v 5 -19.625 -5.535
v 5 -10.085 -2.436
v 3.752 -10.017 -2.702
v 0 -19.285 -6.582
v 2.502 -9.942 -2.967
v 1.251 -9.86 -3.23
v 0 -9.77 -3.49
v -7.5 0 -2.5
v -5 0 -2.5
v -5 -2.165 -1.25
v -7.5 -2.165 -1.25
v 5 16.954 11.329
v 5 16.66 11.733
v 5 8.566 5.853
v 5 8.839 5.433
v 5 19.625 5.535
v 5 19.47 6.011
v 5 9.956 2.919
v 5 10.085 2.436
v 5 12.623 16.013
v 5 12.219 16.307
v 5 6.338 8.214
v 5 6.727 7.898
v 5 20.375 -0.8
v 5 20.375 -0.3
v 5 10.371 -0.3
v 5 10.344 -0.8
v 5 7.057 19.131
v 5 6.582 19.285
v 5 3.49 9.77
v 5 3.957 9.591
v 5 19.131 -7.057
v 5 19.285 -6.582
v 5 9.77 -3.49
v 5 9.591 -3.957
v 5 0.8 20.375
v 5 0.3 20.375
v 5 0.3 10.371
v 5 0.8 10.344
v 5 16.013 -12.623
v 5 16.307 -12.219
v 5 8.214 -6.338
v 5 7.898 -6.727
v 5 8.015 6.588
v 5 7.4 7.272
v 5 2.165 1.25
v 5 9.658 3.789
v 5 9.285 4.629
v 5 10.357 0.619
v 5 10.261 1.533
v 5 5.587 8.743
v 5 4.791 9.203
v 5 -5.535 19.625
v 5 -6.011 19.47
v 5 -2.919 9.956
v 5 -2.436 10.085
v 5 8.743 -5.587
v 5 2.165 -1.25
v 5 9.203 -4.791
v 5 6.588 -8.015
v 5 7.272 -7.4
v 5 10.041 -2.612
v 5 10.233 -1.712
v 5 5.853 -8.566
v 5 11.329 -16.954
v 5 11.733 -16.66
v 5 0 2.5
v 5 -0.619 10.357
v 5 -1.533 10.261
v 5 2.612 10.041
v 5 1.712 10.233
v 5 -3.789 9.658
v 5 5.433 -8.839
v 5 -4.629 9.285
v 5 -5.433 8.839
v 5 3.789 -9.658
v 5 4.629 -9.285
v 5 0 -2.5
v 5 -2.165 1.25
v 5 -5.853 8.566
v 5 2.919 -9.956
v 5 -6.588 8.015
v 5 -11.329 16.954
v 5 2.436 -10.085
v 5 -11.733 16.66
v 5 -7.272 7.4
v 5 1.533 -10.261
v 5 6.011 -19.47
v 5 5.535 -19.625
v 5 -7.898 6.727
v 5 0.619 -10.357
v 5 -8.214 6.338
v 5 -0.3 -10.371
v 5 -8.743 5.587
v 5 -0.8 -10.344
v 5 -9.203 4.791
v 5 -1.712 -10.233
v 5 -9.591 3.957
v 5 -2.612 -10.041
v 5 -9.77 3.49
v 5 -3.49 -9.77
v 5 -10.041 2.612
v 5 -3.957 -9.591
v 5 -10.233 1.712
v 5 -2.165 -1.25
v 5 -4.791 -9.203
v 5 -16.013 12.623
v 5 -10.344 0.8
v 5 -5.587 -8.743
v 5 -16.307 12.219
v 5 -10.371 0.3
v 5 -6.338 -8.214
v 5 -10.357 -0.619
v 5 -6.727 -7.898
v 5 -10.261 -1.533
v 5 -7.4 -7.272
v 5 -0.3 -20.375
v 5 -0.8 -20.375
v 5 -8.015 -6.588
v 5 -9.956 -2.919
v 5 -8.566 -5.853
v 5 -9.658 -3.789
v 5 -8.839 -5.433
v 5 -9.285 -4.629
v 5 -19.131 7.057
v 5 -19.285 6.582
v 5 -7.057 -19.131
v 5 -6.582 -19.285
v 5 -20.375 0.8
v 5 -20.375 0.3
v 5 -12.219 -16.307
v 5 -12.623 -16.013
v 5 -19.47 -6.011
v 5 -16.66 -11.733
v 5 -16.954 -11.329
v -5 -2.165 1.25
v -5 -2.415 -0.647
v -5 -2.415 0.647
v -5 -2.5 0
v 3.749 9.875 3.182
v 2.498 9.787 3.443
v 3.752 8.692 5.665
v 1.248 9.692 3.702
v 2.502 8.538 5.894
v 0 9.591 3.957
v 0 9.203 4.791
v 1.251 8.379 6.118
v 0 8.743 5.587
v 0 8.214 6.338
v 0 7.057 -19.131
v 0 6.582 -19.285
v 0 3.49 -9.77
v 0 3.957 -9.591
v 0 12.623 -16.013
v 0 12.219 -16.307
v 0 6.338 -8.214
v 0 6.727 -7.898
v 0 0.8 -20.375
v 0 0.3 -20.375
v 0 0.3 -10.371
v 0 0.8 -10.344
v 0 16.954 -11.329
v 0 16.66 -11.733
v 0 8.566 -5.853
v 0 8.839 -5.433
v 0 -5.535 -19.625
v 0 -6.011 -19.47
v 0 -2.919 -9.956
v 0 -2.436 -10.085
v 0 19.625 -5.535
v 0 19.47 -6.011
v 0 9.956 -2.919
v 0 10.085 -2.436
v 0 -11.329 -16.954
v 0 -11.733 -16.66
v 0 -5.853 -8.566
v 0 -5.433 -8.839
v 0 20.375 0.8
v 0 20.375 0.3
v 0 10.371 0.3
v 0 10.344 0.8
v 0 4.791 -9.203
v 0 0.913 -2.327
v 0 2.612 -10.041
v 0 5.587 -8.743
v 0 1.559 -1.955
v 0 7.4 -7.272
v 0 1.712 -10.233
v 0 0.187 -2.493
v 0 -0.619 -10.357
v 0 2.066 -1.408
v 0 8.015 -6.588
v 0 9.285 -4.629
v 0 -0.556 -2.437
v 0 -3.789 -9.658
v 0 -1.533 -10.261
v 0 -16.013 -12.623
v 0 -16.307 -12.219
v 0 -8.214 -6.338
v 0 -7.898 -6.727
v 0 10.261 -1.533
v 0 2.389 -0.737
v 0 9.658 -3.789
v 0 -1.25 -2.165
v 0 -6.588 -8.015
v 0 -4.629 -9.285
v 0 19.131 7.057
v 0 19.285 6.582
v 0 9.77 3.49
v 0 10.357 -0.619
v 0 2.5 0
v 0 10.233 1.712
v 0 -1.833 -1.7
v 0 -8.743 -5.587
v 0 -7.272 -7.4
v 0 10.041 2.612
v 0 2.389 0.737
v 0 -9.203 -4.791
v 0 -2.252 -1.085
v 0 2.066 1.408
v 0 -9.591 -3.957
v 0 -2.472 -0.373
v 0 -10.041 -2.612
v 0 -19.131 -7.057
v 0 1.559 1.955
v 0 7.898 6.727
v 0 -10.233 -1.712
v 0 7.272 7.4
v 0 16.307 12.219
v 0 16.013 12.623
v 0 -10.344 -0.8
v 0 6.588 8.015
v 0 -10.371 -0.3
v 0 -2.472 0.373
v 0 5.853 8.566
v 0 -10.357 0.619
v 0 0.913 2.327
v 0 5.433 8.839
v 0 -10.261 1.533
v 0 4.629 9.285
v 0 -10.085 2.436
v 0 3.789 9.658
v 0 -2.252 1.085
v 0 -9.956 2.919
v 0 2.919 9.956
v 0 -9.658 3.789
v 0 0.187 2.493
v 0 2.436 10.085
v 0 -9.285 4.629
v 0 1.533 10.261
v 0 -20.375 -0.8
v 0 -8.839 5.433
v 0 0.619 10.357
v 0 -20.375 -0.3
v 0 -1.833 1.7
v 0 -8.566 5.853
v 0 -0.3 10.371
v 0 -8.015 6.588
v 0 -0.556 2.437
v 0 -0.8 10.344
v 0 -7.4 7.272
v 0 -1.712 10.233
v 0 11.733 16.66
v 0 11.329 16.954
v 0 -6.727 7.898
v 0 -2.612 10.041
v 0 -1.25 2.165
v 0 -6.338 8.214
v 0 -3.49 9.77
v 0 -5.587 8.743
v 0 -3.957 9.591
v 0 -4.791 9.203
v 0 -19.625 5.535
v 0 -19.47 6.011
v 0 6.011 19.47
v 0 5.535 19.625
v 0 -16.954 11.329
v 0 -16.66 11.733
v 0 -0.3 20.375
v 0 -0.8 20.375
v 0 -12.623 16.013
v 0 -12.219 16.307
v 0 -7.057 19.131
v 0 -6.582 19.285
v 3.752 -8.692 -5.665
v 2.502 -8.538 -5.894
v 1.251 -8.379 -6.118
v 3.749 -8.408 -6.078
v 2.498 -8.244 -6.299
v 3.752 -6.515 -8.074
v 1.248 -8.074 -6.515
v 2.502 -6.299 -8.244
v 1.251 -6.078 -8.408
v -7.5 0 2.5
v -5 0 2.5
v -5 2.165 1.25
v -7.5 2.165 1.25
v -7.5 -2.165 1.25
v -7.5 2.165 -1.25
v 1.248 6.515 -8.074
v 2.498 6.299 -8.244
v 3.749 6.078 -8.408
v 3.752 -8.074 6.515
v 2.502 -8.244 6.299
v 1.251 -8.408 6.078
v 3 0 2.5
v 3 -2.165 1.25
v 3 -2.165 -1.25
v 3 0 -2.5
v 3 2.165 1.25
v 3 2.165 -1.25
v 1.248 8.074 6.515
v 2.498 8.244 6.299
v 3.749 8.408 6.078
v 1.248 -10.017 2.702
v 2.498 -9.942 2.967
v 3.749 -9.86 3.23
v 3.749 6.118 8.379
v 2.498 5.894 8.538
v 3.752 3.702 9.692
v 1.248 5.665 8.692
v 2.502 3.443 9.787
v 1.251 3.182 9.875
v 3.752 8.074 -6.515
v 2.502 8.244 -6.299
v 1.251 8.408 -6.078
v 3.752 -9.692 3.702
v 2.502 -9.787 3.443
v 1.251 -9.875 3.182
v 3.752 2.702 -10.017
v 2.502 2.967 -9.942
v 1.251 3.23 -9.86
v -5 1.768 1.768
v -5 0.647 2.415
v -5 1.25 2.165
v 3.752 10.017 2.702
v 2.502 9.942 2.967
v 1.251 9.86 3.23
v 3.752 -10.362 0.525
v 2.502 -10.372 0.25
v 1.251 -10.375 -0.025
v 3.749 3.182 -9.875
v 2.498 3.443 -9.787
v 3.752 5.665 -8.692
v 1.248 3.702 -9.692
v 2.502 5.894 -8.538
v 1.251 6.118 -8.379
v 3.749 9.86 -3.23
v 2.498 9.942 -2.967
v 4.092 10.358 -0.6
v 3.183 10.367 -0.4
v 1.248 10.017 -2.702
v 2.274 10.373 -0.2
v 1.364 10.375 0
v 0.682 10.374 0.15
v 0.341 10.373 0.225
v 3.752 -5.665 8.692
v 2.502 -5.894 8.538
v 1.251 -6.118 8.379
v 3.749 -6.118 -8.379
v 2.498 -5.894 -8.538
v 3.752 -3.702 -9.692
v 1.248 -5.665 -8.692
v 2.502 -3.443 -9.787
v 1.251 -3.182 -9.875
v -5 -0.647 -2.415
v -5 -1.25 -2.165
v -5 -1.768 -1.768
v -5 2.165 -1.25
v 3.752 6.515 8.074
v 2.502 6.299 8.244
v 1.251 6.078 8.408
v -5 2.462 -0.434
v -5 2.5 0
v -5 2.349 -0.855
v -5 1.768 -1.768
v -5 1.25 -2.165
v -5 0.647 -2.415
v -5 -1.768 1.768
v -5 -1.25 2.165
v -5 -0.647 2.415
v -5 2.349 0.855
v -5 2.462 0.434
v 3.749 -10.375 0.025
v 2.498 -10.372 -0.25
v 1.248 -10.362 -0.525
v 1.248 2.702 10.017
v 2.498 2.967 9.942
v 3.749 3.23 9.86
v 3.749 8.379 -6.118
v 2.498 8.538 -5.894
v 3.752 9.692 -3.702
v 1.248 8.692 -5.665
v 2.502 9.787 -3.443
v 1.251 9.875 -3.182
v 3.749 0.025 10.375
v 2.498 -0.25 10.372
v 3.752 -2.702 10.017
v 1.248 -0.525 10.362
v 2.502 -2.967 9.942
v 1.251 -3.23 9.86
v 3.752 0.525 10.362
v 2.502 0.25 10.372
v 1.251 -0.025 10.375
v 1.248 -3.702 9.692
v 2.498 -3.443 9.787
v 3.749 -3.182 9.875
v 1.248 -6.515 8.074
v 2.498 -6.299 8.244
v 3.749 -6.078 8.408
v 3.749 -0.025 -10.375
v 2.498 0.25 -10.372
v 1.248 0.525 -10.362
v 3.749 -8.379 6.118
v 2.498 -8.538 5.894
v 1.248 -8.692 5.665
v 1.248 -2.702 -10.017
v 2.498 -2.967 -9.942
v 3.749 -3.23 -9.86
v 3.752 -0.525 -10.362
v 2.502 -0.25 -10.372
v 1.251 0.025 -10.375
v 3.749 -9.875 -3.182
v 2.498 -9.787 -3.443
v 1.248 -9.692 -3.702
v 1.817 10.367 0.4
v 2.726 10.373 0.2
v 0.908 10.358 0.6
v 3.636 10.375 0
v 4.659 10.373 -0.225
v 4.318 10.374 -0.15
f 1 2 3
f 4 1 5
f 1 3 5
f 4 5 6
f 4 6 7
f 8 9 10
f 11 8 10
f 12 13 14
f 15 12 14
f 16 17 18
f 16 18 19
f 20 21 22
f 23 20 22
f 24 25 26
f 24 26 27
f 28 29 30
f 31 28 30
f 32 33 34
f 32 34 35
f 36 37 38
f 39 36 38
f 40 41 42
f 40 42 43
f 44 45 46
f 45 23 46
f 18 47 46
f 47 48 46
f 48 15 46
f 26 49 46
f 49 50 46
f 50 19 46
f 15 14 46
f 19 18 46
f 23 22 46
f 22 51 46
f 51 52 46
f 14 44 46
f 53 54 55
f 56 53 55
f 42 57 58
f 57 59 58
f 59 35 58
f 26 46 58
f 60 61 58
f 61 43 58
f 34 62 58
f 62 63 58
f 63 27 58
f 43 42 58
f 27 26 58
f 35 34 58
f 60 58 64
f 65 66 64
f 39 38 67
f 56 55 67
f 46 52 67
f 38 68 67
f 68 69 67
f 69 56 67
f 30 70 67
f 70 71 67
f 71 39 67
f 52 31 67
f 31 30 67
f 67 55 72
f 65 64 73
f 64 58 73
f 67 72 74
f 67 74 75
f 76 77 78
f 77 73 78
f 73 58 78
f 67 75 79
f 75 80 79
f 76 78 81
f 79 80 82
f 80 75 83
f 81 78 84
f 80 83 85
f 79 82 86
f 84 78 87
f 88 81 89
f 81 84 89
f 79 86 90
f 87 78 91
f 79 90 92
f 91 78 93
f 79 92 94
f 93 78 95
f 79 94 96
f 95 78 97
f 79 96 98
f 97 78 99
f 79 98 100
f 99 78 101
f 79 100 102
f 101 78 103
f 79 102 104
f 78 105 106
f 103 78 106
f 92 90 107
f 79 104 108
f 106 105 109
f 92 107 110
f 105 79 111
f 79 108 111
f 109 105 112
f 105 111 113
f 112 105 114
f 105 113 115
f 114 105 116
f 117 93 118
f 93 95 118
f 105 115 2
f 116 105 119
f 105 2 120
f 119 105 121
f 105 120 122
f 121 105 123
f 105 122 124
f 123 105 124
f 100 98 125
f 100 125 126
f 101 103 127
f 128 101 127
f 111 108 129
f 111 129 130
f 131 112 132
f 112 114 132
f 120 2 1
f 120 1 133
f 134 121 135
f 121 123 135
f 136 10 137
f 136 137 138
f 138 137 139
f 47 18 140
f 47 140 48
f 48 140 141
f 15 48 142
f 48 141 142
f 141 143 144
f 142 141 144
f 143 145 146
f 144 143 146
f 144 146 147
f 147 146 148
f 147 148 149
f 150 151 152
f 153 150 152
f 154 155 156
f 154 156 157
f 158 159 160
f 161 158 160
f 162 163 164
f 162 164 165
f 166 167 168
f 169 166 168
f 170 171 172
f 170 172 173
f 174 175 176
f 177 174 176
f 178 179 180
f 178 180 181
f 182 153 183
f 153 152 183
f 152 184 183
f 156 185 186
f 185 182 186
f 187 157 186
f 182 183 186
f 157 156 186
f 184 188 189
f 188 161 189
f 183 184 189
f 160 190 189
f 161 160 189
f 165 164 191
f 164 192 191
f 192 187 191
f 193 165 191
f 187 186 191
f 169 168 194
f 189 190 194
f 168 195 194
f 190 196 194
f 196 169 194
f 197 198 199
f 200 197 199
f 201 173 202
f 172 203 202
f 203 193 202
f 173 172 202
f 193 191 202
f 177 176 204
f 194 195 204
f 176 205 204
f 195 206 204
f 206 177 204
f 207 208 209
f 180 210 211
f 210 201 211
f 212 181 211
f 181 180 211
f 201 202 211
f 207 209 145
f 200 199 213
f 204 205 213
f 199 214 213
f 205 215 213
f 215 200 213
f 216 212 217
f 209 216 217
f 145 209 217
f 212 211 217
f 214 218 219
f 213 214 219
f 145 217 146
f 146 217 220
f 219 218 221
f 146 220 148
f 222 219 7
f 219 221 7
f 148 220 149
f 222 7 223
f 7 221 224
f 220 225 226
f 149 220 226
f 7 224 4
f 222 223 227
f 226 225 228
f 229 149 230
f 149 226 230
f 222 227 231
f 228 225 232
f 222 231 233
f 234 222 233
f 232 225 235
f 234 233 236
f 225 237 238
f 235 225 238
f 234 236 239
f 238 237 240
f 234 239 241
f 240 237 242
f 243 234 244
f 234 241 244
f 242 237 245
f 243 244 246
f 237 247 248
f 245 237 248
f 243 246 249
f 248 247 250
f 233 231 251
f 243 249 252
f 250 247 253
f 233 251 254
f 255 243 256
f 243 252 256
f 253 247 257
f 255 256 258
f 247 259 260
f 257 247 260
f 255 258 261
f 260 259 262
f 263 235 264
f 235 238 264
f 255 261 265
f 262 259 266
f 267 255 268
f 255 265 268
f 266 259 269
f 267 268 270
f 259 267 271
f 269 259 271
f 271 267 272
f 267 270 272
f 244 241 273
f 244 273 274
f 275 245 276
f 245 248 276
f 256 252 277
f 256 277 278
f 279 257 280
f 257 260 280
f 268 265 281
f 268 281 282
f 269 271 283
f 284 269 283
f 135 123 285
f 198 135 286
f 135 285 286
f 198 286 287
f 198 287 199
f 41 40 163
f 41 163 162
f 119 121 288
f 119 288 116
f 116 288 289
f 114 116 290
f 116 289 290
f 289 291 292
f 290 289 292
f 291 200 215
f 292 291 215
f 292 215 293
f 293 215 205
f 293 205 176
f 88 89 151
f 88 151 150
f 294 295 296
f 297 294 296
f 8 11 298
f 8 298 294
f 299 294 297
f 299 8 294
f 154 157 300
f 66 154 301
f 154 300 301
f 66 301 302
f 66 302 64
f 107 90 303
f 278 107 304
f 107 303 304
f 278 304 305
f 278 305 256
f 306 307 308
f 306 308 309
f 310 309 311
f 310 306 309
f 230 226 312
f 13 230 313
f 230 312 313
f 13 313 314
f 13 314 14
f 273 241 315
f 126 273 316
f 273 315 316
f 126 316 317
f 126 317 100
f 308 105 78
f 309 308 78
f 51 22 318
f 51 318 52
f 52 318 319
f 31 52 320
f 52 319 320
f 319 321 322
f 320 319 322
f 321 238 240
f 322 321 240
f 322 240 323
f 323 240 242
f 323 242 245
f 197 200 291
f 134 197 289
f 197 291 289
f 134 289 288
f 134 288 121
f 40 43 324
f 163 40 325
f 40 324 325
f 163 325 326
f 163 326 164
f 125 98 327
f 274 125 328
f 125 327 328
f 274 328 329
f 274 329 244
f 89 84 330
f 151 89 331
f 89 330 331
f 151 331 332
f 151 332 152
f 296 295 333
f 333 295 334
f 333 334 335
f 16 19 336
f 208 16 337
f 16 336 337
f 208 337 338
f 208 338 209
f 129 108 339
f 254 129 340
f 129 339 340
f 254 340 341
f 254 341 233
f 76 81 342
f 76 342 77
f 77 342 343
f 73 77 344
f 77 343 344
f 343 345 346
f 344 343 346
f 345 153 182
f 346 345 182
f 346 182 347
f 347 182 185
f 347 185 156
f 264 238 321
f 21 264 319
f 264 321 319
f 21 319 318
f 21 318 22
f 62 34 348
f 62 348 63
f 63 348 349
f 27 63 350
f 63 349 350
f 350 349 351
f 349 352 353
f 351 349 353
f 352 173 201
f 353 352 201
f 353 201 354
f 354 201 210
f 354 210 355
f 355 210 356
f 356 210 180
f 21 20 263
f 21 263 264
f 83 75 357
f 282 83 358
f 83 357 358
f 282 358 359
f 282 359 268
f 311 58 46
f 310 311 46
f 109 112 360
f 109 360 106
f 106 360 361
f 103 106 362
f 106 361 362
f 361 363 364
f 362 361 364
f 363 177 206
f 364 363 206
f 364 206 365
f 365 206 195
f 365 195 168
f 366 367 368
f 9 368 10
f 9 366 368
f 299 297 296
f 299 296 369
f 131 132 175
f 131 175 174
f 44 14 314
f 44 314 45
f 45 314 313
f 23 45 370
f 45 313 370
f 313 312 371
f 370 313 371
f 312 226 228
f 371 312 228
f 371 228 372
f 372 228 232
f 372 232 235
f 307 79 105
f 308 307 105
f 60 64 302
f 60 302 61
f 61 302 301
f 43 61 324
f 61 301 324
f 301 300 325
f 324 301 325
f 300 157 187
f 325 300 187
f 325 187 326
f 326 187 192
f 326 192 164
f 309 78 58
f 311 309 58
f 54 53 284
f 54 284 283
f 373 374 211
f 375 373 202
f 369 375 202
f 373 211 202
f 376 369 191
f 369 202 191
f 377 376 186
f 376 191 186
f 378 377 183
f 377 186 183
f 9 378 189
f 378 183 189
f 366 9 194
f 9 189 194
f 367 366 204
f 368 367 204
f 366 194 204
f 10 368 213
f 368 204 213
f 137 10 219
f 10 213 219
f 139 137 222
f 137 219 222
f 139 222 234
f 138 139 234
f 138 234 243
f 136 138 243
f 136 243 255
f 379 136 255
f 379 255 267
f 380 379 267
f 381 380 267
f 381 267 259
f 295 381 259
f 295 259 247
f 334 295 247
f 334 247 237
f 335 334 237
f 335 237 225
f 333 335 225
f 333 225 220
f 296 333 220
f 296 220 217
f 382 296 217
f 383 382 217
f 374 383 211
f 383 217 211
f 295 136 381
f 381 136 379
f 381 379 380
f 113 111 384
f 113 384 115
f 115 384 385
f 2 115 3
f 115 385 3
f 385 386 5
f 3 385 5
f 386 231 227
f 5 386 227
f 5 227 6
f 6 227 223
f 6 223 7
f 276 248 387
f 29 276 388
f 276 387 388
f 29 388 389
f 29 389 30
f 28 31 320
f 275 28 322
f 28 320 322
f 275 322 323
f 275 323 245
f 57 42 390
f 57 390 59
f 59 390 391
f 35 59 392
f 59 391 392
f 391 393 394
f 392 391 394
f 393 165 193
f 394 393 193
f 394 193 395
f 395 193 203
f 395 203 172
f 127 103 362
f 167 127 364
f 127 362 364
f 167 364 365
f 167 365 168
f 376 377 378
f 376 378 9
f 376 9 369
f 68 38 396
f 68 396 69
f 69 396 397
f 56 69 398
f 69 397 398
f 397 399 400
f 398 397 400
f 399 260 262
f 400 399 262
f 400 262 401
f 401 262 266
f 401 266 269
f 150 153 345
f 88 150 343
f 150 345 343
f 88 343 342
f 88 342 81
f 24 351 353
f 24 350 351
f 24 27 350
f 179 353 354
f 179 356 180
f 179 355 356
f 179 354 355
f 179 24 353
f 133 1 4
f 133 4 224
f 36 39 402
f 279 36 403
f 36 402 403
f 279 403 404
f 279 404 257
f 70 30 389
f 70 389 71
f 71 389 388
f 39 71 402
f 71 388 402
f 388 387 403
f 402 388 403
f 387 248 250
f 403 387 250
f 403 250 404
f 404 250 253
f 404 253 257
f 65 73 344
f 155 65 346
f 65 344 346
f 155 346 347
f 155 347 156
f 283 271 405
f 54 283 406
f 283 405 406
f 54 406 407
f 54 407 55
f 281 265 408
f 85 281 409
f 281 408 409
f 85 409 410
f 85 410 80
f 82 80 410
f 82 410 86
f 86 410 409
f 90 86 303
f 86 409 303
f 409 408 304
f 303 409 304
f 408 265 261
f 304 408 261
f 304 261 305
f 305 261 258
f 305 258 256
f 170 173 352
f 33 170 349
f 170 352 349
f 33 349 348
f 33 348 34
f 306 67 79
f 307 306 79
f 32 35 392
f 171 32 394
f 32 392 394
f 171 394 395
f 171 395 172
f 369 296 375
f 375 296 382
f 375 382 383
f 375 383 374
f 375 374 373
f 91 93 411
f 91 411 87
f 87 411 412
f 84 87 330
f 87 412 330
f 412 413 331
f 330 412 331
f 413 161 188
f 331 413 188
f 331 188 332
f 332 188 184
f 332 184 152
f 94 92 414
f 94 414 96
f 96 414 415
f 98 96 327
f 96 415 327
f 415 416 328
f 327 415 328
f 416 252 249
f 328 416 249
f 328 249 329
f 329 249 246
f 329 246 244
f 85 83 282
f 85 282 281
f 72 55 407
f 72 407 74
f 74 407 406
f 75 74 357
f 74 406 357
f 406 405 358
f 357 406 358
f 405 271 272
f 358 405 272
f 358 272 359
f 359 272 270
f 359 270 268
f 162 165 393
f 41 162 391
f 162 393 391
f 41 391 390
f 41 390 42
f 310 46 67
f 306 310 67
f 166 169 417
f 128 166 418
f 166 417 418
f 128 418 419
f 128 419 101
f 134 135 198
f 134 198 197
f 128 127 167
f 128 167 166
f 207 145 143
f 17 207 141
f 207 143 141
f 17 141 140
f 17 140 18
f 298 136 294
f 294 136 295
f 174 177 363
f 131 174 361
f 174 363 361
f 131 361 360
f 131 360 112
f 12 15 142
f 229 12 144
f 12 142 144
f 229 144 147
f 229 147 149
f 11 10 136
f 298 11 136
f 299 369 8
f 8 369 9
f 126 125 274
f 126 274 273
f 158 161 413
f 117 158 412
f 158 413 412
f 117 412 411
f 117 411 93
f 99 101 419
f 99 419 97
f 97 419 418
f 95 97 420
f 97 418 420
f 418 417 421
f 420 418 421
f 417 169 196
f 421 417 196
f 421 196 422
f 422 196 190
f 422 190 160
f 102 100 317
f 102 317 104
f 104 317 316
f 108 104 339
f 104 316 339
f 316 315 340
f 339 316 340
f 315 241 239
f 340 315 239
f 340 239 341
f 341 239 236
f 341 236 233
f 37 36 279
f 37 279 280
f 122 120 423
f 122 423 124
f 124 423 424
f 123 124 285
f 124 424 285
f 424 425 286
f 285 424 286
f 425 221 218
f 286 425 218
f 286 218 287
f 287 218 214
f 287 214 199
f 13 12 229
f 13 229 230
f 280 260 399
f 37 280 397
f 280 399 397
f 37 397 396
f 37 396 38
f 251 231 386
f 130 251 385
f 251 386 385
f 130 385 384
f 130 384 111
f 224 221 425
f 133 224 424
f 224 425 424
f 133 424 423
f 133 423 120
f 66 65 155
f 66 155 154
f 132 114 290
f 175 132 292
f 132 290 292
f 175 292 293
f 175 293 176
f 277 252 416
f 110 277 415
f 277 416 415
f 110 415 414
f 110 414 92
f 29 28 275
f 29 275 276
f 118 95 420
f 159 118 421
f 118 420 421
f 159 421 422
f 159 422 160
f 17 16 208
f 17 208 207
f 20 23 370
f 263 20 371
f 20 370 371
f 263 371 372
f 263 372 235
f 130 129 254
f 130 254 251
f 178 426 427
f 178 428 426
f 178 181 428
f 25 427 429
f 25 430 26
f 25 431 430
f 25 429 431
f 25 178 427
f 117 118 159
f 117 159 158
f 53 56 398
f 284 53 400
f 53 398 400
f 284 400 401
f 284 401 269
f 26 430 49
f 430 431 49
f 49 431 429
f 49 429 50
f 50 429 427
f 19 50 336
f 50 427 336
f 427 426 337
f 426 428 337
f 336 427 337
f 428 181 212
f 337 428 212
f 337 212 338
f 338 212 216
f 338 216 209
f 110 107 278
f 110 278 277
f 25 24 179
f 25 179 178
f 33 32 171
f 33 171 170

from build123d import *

# Parameters (mm, degrees)
SKETCH_R           = 10.375
PAD_DEPTH          = 5
POCKET_DEPTH       = 2
PAD001_DEPTH       = 10
PAD001_DEPTH_BACK  = 1
POLARPATTERN_COUNT = 20
SKETCH003_R        = 2.5
PAD002_DEPTH       = 5
PAD003_DEPTH       = 2.5


with BuildPart() as part:
    # Sketch → Pad (new body)
    with BuildSketch(Plane.YZ):
        Circle(SKETCH_R)
    extrude(amount=PAD_DEPTH)

    # Sketch001 (on Face3 of Pad) → Pocket (cut)
    with BuildSketch(Plane.YZ.offset(5)):
        Polygon((2.165064, 1.25), (0, 2.5), (-2.165064, 1.25), (-2.165064, -1.25), (0, -2.5), (2.165064, -1.25), align=None)
    extrude(amount=-POCKET_DEPTH, mode=Mode.SUBTRACT)

    # Sketch002 (on DatumPlane) → Pad001 (join, two sides)
    with BuildSketch(Plane.ZX.offset(10.375)) as pad001_sk:
        Polygon((0.8, 0), (-0.3, 5), (-0.8, 5), (0.3, 0), align=None)
    pad001 = extrude(amount=PAD001_DEPTH) + extrude(pad001_sk.sketch, amount=-PAD001_DEPTH_BACK)

    # PolarPattern: Pad001 ×20 about axis
    polarpattern_axis = Axis((0, 0, 0), (1, 0, 0))
    for i in range(1, POLARPATTERN_COUNT):
        add(pad001.rotate(polarpattern_axis, i * 360 / POLARPATTERN_COUNT))

    # Sketch003 (on Face2 of PolarPattern) → Pad002 (join)
    with BuildSketch(Plane(origin=(0, 0, 0), x_dir=(0, 1, 0), z_dir=(-1, 0, 0))):
        Circle(SKETCH003_R)
    extrude(amount=PAD002_DEPTH)

    # Sketch004 (on Face108 of Pad002) → Pad003 (join)
    with BuildSketch(Plane(origin=(-5, 0, 0), x_dir=(0, 1, 0), z_dir=(-1, 0, 0))):
        Polygon((2.165064, 1.25), (0, 2.5), (-2.165064, 1.25), (-2.165064, -1.25), (0, -2.5), (2.165064, -1.25), align=None)
    extrude(amount=PAD003_DEPTH)


solid = part.part
